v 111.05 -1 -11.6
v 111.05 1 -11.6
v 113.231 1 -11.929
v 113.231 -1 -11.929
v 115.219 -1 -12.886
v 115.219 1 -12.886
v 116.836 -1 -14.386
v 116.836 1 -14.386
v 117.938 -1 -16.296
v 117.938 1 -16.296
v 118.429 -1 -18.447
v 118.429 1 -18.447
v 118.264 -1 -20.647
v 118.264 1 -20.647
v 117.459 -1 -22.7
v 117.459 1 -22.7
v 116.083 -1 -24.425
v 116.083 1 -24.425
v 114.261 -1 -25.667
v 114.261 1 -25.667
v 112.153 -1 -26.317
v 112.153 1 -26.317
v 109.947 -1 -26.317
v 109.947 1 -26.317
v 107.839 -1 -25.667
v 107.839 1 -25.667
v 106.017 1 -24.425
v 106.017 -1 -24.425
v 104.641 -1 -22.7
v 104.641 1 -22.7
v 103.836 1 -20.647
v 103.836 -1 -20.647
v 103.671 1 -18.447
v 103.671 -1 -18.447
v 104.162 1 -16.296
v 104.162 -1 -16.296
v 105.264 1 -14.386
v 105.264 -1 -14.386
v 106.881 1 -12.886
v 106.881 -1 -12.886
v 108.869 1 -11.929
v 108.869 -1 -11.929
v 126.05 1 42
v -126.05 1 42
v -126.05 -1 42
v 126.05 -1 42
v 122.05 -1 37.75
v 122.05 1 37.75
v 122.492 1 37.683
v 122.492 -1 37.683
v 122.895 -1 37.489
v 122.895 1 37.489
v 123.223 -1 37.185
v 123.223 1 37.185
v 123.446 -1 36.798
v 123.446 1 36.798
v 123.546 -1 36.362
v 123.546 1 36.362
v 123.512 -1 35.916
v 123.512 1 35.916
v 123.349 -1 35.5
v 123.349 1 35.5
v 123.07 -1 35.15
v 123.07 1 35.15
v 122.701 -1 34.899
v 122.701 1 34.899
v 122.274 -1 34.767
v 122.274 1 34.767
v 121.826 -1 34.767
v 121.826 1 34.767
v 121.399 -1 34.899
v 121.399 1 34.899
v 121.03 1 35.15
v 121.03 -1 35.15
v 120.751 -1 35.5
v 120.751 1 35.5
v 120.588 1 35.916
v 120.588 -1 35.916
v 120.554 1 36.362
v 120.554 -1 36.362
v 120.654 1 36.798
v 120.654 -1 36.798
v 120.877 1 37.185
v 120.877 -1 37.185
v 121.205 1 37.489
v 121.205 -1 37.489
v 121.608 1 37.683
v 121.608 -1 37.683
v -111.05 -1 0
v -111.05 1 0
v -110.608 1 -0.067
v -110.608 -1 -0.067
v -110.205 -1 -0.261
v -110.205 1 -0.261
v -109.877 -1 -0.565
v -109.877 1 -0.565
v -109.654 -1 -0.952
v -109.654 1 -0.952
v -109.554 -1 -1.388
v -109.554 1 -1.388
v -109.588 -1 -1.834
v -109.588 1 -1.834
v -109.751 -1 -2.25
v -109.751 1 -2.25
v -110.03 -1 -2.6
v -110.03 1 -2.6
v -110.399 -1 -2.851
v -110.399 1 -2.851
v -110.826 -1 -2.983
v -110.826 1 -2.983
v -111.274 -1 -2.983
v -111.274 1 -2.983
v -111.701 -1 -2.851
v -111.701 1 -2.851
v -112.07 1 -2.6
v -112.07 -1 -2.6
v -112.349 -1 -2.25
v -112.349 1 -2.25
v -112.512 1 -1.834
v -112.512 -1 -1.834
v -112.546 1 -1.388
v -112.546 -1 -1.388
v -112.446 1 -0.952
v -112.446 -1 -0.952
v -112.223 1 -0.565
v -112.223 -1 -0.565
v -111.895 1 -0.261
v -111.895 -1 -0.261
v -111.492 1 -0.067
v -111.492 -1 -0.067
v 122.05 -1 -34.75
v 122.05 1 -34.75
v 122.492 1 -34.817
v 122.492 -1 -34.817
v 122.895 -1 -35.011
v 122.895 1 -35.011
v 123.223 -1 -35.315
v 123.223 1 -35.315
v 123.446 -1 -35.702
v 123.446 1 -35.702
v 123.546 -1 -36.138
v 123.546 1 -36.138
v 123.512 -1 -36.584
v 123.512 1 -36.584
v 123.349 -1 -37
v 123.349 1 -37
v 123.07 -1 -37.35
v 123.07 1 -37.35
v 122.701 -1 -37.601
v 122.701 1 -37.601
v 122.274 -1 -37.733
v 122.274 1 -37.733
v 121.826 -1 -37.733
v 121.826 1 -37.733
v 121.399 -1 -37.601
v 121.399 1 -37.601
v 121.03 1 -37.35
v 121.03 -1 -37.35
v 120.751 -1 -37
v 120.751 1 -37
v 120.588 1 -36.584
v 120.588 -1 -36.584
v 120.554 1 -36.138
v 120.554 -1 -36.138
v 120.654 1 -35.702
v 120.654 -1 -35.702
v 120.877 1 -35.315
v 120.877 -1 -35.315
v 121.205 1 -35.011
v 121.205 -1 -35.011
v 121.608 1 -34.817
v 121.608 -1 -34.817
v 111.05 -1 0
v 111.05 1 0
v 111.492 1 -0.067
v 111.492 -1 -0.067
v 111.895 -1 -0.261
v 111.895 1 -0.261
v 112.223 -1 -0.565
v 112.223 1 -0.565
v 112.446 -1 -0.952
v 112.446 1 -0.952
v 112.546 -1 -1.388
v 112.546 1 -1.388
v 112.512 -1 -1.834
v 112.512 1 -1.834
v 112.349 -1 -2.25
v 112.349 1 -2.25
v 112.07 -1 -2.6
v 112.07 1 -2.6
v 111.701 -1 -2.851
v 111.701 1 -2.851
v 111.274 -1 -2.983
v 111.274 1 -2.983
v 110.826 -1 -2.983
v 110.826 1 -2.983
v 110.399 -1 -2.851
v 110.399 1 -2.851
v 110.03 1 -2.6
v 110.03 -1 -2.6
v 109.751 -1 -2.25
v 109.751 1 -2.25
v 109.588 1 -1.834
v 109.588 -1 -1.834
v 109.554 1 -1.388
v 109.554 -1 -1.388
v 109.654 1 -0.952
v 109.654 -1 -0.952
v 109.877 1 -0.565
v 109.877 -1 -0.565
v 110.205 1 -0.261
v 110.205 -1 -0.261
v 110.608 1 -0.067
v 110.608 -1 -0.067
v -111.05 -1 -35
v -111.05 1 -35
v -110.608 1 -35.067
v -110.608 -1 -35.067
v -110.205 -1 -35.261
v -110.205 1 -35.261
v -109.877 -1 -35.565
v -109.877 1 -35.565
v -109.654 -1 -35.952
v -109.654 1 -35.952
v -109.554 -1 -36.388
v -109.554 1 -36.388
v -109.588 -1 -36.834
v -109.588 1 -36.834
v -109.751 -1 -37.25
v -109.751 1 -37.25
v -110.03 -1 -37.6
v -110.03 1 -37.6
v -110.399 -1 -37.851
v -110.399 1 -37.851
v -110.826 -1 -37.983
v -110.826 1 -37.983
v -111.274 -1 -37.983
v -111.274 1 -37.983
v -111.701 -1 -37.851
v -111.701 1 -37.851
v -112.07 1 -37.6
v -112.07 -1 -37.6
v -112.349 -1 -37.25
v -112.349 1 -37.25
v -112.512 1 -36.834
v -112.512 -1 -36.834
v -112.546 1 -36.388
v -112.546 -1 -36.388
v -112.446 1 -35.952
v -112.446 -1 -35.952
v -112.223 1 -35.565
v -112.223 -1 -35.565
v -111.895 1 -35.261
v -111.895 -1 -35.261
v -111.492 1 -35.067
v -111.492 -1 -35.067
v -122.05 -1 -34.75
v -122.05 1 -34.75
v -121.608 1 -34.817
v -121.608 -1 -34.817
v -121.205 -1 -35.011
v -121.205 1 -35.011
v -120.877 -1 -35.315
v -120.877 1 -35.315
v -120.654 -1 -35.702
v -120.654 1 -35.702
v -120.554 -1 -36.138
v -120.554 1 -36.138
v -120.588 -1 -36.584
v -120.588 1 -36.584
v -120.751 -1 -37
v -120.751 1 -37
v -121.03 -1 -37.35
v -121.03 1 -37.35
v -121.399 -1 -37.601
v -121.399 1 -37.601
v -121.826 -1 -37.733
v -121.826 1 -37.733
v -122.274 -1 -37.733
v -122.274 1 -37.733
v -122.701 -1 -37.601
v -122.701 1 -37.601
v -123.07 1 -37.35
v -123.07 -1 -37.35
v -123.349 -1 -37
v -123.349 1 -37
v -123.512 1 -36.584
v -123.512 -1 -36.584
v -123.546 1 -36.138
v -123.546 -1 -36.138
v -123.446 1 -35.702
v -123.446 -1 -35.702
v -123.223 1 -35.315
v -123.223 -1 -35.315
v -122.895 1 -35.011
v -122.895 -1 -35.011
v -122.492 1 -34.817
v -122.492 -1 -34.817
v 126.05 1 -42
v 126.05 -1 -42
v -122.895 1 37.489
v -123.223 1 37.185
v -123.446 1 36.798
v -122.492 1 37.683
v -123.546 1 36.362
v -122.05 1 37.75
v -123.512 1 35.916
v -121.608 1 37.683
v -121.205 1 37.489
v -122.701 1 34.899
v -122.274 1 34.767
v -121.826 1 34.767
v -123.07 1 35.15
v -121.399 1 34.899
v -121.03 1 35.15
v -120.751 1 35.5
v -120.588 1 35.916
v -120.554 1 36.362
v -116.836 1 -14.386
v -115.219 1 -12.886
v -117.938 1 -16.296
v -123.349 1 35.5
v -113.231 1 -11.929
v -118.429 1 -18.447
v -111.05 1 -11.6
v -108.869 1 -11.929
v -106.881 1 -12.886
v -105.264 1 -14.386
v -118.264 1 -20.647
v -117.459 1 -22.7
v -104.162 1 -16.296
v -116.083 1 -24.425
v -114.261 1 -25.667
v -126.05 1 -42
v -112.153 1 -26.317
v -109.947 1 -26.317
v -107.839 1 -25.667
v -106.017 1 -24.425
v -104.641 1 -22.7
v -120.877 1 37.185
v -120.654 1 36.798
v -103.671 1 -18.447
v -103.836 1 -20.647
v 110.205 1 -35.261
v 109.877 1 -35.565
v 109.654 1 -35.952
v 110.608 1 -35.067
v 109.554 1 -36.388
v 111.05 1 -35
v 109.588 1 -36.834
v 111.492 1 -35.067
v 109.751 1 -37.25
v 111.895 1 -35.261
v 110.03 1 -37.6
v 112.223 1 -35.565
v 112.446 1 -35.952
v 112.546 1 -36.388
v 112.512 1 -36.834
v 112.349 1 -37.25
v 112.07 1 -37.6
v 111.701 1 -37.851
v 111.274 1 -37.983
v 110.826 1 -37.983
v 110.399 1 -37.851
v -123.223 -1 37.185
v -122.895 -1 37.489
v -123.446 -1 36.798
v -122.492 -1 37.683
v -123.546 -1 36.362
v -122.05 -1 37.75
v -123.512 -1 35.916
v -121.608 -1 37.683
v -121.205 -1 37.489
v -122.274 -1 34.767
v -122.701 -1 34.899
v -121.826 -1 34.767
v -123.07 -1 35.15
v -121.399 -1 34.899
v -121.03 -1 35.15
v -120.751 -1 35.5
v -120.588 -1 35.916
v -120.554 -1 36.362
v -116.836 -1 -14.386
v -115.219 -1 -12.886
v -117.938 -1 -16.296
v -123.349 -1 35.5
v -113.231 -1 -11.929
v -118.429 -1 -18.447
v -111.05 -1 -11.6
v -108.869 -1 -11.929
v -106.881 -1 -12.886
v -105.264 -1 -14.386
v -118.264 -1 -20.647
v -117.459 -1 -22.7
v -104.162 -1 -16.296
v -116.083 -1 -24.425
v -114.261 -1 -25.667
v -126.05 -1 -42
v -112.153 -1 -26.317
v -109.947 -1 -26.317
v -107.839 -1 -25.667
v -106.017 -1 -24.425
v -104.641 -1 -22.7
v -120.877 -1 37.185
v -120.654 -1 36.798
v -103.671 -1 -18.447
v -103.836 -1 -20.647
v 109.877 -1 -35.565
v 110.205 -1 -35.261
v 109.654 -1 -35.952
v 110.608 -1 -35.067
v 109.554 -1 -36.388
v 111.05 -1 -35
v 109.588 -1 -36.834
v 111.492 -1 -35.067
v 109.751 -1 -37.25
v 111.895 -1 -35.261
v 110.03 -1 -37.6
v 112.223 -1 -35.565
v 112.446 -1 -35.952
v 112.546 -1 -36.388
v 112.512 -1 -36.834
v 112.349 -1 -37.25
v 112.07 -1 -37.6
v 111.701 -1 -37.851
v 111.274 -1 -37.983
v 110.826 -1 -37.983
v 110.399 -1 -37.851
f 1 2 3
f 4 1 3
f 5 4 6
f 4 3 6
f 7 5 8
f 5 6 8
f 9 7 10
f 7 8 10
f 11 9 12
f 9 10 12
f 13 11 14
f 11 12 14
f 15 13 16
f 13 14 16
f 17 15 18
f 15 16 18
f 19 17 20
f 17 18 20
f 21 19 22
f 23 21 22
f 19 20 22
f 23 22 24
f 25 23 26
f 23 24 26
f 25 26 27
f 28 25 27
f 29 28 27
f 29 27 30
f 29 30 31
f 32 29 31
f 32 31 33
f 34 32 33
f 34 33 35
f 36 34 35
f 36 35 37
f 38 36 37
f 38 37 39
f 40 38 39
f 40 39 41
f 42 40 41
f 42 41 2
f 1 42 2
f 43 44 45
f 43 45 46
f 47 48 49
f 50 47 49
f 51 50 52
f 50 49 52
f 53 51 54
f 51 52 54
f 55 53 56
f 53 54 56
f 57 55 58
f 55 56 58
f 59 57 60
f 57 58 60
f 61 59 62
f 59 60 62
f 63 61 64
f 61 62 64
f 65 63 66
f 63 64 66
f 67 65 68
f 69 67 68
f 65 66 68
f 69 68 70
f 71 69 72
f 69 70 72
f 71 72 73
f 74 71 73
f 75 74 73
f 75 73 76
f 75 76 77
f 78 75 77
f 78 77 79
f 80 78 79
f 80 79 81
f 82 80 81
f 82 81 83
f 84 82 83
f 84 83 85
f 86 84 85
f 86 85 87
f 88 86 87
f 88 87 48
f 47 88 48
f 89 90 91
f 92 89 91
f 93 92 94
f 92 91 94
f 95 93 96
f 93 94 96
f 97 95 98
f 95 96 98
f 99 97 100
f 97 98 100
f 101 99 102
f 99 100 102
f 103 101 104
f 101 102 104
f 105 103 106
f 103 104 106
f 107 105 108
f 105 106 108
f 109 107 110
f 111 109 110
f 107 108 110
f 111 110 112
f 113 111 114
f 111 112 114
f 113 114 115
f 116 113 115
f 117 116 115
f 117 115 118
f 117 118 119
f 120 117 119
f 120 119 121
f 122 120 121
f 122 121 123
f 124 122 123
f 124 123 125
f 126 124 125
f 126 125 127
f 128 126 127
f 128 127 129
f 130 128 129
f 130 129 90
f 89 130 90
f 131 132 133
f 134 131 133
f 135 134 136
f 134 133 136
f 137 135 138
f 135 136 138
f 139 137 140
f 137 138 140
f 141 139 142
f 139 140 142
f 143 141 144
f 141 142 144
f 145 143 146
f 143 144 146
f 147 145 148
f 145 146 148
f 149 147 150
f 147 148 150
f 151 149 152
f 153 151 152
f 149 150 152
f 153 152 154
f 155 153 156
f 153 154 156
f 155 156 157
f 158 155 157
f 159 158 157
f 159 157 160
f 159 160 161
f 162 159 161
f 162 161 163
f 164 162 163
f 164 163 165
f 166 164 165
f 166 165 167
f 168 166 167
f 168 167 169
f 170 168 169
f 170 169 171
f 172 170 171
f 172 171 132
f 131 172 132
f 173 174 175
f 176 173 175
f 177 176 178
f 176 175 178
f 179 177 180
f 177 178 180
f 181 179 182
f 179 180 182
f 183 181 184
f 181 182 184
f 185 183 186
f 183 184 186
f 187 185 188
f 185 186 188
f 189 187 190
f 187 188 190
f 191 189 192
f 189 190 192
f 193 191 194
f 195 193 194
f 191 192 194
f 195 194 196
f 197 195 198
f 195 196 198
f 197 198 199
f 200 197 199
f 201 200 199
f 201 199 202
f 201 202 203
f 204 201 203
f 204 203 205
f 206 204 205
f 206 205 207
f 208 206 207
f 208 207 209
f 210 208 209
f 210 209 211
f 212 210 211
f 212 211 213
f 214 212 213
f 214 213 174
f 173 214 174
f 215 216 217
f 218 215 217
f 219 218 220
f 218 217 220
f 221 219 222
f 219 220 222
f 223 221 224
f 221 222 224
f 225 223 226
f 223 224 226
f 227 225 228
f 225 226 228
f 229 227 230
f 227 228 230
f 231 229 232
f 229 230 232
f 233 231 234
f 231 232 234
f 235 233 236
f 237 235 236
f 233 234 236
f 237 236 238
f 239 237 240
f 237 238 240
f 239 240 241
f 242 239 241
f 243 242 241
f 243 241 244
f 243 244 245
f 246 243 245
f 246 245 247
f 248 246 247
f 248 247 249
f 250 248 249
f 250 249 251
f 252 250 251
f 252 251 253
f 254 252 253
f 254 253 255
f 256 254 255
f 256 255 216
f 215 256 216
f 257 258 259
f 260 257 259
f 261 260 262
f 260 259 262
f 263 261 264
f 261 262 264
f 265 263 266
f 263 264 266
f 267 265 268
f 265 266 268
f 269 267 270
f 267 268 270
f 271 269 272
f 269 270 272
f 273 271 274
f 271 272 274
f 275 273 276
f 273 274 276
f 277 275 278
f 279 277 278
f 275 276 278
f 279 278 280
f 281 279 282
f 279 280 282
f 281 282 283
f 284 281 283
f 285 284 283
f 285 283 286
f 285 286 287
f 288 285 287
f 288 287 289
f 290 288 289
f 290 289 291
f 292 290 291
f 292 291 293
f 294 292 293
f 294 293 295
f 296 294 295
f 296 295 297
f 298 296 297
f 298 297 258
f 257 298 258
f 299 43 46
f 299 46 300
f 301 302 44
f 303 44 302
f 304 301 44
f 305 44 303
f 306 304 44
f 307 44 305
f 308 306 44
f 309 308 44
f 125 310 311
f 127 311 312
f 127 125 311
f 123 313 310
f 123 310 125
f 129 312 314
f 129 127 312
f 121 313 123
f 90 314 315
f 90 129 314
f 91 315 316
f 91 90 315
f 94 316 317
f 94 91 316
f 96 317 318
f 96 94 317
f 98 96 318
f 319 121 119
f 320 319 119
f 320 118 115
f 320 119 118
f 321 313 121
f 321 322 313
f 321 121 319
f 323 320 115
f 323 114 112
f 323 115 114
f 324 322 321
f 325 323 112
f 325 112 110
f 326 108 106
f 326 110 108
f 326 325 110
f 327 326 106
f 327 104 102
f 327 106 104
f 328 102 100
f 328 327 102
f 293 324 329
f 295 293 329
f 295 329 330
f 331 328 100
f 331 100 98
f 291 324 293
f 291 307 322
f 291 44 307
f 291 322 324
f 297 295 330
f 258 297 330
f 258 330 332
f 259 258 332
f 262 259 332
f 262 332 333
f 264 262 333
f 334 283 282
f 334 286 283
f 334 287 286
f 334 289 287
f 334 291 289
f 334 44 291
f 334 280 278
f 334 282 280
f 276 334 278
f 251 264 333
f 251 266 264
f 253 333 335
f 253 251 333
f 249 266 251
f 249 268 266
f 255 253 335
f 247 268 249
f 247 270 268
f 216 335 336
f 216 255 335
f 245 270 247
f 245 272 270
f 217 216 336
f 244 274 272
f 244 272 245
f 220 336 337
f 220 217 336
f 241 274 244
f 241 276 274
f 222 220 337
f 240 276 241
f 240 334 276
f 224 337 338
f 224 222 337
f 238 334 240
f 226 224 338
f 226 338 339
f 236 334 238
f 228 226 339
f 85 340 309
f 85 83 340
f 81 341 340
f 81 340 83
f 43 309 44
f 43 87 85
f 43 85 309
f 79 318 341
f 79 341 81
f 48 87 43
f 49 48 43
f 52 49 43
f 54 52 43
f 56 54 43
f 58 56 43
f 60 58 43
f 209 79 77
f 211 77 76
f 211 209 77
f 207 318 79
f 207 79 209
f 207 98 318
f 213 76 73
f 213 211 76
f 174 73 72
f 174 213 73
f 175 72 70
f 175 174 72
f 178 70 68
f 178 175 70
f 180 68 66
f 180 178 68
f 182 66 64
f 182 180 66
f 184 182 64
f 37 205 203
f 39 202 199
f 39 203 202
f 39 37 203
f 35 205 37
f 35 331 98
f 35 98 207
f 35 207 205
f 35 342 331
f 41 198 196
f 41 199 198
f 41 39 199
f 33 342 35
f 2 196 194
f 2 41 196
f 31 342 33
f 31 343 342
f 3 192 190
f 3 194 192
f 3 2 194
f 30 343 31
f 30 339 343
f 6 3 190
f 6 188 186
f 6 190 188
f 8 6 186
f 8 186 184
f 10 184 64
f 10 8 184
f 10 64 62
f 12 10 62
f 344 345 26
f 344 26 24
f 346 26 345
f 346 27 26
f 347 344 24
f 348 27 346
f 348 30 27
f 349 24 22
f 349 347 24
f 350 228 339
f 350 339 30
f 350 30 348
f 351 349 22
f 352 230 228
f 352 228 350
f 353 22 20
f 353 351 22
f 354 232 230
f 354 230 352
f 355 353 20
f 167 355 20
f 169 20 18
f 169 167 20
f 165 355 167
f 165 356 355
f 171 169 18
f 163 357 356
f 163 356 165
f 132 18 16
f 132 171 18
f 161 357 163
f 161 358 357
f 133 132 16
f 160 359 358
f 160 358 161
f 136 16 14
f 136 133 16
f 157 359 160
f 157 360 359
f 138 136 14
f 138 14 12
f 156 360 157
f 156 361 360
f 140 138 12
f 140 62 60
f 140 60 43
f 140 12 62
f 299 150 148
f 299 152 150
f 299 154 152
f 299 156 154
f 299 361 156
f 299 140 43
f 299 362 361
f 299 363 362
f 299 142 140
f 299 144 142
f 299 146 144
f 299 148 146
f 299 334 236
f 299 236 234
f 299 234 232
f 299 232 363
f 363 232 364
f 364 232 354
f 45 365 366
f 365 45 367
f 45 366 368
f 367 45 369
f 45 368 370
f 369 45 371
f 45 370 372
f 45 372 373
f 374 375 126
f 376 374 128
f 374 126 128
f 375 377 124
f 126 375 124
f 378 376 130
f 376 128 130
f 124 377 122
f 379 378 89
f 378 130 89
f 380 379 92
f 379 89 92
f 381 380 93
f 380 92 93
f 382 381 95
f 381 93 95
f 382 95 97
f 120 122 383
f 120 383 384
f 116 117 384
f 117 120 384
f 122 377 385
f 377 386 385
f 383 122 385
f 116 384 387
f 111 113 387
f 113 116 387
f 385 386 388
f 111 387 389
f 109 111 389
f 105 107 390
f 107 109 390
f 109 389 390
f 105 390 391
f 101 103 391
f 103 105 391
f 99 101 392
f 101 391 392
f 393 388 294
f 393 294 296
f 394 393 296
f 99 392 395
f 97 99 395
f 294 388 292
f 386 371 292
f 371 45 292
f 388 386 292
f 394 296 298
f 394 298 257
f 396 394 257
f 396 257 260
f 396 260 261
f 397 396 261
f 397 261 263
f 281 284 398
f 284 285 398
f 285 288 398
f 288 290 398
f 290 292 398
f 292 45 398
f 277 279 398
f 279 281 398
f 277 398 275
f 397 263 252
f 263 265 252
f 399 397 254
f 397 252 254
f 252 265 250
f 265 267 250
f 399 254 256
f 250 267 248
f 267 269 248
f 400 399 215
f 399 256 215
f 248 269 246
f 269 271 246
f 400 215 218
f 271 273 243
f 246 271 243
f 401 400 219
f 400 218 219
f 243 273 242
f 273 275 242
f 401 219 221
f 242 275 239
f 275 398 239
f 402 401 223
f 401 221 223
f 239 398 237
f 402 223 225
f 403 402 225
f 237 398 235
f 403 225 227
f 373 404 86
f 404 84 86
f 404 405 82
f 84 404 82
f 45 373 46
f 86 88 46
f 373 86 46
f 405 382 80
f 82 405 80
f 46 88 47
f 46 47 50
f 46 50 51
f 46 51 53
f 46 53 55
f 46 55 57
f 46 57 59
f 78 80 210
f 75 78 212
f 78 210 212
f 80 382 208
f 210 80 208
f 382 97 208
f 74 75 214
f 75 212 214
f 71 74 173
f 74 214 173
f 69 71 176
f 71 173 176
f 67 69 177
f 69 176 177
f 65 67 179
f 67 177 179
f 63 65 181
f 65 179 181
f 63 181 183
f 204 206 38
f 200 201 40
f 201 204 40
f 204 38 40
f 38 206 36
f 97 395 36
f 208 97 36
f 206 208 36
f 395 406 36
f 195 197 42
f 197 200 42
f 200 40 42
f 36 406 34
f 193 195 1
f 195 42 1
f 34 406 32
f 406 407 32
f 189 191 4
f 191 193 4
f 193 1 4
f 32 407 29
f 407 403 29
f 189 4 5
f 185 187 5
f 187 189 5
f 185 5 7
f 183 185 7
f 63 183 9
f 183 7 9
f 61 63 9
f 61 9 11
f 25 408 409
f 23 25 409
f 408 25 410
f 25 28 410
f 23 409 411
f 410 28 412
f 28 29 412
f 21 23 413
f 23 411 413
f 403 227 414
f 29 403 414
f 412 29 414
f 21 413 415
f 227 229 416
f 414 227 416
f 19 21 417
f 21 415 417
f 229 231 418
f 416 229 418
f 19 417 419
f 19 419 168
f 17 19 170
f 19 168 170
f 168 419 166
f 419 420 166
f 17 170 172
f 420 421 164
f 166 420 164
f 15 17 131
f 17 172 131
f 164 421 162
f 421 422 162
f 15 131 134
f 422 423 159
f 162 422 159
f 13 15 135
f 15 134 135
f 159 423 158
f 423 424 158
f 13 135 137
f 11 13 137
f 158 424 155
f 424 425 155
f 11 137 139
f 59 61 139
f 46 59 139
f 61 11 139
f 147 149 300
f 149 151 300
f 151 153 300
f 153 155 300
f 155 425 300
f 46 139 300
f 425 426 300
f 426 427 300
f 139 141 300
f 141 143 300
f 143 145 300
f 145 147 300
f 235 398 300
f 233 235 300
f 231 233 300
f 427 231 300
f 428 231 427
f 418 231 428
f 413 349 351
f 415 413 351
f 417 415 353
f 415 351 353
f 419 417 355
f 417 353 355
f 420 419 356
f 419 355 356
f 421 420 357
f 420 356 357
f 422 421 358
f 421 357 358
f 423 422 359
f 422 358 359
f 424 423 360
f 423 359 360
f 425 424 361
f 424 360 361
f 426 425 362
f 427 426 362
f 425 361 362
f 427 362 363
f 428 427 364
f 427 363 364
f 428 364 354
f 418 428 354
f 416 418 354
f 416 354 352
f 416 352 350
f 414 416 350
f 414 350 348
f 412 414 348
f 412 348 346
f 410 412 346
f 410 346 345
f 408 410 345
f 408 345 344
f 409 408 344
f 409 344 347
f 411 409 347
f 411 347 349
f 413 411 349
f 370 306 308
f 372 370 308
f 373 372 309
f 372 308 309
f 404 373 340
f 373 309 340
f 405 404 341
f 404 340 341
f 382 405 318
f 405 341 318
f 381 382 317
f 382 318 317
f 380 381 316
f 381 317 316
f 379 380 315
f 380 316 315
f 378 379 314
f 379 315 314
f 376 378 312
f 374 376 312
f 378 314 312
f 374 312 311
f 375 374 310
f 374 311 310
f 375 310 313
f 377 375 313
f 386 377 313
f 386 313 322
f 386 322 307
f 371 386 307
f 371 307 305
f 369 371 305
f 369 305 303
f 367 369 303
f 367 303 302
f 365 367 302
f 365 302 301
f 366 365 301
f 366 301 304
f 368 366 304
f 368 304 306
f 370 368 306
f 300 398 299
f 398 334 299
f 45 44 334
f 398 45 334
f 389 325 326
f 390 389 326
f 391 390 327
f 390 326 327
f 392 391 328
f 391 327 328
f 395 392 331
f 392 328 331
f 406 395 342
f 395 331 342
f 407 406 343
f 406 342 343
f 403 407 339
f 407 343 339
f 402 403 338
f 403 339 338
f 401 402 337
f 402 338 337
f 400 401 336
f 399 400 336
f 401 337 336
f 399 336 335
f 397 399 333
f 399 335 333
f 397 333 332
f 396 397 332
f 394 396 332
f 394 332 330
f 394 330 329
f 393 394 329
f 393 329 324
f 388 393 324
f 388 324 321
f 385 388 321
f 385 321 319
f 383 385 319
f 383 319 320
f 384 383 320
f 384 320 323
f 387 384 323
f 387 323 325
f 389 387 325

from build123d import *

# Parameters (mm, degrees)
SKETCH_1_W         = 252.1
SKETCH_1_H         = 84
EXTRUDE_1_DEPTH    = 1
SKETCH1_R          = 1.5
CUT_EXTRUDE1_DEPTH = 10
SKETCH4_R          = 7.4
CUT_EXTRUDE3_DEPTH = 133.878149069
SKETCH5_R          = 1.5
CUT_EXTRUDE4_DEPTH = 10


with BuildPart() as part:
    # 草图1 → 凸台-拉伸1 (new, symmetric)
    with BuildSketch(Plane(origin=(0, 0, 0), x_dir=(1, 0, 0), z_dir=(0, 1, 0))):
        Rectangle(SKETCH_1_W, SKETCH_1_H)
    extrude(amount=EXTRUDE_1_DEPTH, both=True)

    # Sketch1 → Cut-Extrude1 (cut)
    with BuildSketch(Plane(origin=(0, 1, 0), x_dir=(1, 0, 0), z_dir=(0, 1, 0))):
        with Locations(Location((-122.05, 36.25, 0), (0, 0, 270))):
            Circle(SKETCH1_R)
        with Locations(Location((-122.05, -36.25, 0), (0, 0, 270))):
            Circle(SKETCH1_R)
        with Locations(Location((122.05, -36.25, 0), (0, 0, 270))):
            Circle(SKETCH1_R)
        with Locations(Location((122.05, 36.25, 0), (0, 0, 270))):
            Circle(SKETCH1_R)
    extrude(amount=-CUT_EXTRUDE1_DEPTH, mode=Mode.SUBTRACT)

    # Sketch4 → Cut-Extrude3 (cut, through all)
    with BuildSketch(Plane(origin=(0, 1, 0), x_dir=(1, 0, 0), z_dir=(0, 1, 0))):
        with Locations(Location((-111.05, 19, 0), (0, 0, 270))):
            Circle(SKETCH4_R)
        with Locations(Location((111.05, 19, 0), (0, 0, 270))):
            Circle(SKETCH4_R)
    extrude(amount=-CUT_EXTRUDE3_DEPTH, mode=Mode.SUBTRACT)

    # Sketch5 → Cut-Extrude4 (cut)
    with BuildSketch(Plane(origin=(0, 1, 0), x_dir=(1, 0, 0), z_dir=(0, 1, 0))):
        with Locations(Location((-111.05, 1.5, 0), (0, 0, 270))):
            Circle(SKETCH5_R)
        with Locations(Location((-111.05, 36.5, 0), (0, 0, 270))):
            Circle(SKETCH5_R)
        with Locations(Location((111.05, 1.5, 0), (0, 0, 270))):
            Circle(SKETCH5_R)
        with Locations(Location((111.05, 36.5, 0), (0, 0, 270))):
            Circle(SKETCH5_R)
    extrude(amount=-CUT_EXTRUDE4_DEPTH, mode=Mode.SUBTRACT)


solid = part.part
